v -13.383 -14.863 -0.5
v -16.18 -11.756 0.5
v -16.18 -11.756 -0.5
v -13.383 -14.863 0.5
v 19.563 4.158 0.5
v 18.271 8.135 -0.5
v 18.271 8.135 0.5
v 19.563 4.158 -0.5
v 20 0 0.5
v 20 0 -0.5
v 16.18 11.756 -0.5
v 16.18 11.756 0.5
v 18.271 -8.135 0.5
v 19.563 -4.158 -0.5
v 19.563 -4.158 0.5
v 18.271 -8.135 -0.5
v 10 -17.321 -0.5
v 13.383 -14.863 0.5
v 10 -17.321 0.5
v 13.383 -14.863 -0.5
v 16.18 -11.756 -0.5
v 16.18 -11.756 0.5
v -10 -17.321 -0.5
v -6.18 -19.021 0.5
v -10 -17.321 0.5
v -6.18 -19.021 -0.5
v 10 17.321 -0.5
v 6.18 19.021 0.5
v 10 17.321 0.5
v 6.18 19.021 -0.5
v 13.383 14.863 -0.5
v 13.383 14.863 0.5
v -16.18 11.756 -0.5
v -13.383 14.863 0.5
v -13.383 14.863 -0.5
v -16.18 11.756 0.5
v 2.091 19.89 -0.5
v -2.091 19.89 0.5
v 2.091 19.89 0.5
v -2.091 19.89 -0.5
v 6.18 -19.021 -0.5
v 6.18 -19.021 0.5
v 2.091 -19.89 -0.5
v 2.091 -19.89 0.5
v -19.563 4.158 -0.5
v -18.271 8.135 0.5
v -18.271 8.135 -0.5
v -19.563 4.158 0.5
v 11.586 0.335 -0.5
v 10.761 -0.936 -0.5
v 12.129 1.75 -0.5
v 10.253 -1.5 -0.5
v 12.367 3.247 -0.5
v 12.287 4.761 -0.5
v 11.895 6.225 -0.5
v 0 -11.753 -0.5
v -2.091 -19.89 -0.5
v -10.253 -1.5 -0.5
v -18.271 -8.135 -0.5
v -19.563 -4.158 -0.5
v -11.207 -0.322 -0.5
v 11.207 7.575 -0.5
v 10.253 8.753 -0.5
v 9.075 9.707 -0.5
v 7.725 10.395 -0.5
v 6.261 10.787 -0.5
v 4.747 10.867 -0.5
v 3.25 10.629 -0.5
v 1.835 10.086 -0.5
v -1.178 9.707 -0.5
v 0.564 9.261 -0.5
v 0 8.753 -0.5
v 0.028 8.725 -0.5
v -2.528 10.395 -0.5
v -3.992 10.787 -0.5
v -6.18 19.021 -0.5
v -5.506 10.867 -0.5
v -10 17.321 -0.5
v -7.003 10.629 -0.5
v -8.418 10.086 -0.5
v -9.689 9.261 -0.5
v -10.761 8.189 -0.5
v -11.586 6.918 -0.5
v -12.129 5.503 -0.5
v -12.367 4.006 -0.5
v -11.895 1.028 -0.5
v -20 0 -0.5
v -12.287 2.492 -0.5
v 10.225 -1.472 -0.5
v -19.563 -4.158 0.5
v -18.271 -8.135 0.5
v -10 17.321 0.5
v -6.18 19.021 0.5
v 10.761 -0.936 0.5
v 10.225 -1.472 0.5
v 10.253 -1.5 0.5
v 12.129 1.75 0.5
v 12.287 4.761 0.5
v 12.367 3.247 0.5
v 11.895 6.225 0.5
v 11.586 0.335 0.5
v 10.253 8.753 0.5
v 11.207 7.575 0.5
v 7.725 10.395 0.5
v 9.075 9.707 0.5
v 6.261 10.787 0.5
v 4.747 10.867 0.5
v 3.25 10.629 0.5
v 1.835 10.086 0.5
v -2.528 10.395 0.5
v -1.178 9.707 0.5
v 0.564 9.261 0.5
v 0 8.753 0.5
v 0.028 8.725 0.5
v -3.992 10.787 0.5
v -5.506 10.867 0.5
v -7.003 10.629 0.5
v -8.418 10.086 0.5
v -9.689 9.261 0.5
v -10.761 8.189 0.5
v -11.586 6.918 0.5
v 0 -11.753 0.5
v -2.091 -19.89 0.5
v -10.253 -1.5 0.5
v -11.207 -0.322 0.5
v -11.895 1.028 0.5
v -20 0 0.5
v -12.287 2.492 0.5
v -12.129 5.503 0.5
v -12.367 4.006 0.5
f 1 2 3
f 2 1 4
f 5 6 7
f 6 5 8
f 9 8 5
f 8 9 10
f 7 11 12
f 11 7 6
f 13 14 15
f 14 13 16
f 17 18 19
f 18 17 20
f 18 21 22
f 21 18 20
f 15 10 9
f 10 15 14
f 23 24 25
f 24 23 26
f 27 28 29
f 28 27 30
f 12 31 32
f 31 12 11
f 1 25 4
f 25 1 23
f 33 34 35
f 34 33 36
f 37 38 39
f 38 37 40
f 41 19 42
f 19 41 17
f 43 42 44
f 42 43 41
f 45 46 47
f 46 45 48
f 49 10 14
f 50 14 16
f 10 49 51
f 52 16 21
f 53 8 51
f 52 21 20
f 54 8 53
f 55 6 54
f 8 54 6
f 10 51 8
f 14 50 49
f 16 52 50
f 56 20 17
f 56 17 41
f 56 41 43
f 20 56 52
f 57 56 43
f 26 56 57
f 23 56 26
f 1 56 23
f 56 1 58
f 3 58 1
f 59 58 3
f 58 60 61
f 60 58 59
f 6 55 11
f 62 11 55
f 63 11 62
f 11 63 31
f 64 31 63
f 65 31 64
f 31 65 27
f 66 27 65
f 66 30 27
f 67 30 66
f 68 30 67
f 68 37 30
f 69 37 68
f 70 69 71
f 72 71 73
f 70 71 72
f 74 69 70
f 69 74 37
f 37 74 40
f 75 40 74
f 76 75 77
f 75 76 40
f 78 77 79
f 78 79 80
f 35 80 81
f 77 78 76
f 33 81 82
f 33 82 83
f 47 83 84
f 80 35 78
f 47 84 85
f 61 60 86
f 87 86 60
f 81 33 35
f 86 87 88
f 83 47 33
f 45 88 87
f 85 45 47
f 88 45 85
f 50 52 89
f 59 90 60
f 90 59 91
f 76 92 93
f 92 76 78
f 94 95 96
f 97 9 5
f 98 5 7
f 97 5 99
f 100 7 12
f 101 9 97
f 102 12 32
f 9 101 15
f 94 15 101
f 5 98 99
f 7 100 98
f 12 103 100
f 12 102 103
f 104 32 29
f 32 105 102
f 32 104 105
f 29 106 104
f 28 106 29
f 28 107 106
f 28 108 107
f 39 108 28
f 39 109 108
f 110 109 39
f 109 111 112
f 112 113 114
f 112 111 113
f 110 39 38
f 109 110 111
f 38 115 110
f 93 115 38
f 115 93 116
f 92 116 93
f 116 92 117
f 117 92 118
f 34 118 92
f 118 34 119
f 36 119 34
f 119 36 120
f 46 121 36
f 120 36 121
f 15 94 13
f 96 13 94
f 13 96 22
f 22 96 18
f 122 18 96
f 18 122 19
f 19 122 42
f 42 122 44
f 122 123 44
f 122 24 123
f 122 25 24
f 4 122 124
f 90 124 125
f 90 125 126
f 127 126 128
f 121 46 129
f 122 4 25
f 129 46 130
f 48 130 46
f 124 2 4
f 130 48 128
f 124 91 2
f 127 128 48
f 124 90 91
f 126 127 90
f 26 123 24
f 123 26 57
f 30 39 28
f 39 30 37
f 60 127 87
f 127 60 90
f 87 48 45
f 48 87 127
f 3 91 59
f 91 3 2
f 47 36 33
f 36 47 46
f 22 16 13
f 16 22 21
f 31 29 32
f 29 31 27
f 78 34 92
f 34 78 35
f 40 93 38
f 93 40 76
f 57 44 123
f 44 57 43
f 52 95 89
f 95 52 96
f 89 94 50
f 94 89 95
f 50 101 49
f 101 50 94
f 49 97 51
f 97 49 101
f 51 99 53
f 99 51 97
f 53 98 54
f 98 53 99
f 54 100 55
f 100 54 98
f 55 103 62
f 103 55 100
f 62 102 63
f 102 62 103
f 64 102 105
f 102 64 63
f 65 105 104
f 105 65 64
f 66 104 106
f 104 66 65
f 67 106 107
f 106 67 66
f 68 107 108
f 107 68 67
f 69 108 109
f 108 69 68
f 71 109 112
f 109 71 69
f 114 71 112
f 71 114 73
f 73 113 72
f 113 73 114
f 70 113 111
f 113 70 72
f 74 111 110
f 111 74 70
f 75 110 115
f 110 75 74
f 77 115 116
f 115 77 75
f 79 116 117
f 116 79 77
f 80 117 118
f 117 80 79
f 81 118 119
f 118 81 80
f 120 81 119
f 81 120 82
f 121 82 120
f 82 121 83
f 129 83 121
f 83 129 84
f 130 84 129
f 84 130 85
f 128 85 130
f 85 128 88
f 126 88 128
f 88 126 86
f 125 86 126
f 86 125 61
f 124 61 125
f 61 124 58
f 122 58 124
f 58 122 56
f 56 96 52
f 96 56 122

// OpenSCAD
// file: ../../../../../../../../../openscad/models/src/main/openscad/shapes/heart/heart.scad
module heart(height=1)
{
    rotate ([0, 0, 45])
    linear_extrude(height=height)
    flatHeart();
}

module heartThumbnail(height=1)
{
    xyScale = 0.725;
    translate([0, -1.5, 0])
    scale([xyScale, xyScale, 1])
    heart(height);
}

module flatHeart()
{
    square(20, center = true);

    translate([10,0,0])
    circle(10
//        , center = true
);
//    circle(10, center = true);

    translate([0,10,0])
    circle(10
//        , center = true
    );
//    circle(10, center = true);
}
// main file
use <../../../../../../../../../openscad/models/src/main/openscad/shapes/heart/heart.scad>

color([1,0.6863,0.6863])difference(){cylinder(h=1, r=20, center=true);
scale([1,1,1.02])translate([0,0,-0.5])heartThumbnail();}
